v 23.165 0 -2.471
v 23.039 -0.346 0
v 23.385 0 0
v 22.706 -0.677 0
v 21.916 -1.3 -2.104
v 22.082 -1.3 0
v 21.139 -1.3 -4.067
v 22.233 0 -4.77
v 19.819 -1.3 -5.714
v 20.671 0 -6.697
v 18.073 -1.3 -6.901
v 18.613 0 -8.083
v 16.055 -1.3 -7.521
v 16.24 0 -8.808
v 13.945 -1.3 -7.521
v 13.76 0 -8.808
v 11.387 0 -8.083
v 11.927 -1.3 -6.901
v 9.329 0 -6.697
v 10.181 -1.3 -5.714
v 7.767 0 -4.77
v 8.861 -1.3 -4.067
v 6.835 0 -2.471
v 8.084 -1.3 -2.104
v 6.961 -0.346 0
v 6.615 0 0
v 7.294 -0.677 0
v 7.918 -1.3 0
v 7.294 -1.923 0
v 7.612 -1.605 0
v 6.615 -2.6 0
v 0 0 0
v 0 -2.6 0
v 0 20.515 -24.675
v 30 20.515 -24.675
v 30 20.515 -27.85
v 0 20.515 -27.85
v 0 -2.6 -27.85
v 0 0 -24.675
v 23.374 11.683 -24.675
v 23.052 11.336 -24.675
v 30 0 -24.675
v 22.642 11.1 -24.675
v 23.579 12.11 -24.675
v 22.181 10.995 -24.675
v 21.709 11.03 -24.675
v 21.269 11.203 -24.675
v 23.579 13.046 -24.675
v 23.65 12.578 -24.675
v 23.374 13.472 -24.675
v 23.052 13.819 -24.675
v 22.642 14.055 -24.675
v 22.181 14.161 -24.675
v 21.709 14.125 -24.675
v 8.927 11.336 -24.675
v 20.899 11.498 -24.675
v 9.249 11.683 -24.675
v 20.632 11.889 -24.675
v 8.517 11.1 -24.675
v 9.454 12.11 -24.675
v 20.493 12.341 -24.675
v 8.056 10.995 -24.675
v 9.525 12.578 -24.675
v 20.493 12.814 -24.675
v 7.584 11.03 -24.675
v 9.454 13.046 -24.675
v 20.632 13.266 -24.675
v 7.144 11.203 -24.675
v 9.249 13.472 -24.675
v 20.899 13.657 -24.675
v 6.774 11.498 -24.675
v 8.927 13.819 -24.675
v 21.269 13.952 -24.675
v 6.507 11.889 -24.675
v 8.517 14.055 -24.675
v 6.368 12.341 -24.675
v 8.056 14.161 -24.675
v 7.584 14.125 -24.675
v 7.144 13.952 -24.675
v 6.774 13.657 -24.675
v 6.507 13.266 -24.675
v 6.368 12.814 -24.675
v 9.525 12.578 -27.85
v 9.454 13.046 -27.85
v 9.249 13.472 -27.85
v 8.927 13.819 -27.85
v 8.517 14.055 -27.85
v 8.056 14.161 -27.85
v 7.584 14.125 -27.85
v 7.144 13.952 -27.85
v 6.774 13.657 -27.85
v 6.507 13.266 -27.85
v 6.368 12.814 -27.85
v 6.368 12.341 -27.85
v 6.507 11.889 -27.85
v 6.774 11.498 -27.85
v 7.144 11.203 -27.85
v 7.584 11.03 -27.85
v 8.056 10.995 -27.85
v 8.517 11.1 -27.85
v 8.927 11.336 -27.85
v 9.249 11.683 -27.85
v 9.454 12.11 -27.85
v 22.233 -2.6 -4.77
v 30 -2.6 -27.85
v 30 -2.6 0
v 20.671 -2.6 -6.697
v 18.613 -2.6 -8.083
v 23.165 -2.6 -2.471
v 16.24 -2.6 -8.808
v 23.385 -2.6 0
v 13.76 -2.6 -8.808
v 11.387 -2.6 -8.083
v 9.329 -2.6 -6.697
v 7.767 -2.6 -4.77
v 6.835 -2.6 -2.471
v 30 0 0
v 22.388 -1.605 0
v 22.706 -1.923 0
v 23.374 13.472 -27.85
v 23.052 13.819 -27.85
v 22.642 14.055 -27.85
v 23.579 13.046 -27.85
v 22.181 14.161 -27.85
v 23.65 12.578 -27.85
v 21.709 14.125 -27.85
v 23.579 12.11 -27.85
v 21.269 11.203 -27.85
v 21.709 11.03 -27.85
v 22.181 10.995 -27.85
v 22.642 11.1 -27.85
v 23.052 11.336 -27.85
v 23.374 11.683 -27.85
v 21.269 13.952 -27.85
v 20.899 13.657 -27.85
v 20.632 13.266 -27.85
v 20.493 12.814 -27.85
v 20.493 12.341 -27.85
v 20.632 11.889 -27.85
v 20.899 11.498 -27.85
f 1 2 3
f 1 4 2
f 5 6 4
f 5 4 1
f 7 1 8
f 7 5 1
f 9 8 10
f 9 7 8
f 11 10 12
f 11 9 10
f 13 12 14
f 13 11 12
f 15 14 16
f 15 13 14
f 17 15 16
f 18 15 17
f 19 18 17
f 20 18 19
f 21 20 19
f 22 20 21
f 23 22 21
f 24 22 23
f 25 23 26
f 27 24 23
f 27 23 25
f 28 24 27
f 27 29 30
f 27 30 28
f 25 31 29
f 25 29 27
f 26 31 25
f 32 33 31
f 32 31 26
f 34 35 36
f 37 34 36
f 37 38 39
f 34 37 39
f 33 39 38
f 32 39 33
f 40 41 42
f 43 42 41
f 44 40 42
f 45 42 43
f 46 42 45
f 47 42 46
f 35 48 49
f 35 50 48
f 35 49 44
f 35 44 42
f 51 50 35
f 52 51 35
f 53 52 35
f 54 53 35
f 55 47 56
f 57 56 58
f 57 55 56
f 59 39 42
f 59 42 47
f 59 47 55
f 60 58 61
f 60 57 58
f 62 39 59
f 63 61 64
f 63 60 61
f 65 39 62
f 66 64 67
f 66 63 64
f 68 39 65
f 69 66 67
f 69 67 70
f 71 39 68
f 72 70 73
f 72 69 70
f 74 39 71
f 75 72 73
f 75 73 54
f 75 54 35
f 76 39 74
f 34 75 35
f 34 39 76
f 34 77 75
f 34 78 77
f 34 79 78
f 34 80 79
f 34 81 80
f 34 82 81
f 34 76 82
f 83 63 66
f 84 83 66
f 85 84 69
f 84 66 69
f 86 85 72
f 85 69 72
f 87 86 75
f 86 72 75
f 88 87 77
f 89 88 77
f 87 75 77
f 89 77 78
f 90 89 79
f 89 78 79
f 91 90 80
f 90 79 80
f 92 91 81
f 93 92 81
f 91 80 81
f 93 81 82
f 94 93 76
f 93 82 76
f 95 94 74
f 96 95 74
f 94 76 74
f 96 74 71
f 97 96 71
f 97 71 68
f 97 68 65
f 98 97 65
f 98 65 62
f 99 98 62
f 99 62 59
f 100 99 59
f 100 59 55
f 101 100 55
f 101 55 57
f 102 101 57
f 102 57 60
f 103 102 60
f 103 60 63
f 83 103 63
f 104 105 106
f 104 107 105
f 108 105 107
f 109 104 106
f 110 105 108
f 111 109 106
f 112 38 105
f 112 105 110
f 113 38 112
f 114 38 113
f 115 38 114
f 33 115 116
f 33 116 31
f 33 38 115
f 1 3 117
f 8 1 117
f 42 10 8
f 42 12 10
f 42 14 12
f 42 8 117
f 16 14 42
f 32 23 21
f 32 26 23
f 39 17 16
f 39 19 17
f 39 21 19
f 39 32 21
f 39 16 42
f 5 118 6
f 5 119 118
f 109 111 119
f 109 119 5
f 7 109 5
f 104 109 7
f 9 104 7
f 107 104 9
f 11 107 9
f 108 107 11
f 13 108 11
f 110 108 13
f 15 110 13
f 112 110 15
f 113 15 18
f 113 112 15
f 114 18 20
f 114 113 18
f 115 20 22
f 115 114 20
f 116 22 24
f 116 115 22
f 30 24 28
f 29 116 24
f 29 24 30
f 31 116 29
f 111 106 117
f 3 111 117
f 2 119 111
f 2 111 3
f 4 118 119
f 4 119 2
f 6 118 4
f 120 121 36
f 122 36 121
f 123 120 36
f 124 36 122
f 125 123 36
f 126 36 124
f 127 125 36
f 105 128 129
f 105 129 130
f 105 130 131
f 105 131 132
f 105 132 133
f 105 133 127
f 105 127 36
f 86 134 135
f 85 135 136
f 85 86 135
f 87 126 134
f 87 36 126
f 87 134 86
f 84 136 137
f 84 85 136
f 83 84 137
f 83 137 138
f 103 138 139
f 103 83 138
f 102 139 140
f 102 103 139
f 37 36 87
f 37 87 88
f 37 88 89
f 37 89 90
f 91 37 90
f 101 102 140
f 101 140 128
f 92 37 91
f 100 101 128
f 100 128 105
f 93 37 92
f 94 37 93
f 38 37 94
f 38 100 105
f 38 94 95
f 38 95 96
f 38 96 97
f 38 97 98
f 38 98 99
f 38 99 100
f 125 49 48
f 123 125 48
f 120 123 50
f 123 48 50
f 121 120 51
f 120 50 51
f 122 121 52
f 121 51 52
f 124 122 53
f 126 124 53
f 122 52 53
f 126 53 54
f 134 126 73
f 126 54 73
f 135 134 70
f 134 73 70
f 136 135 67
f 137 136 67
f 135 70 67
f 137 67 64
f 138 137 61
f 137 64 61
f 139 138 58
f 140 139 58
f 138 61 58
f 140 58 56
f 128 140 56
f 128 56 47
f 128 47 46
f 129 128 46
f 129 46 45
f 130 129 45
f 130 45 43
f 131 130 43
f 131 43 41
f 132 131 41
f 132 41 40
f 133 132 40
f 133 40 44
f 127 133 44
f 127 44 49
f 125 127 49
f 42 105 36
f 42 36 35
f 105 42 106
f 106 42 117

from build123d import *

# Parameters (mm, degrees)
PROFILE_BOSS_EXTRUDE1_DEPTH      = 30
COLLARCUT_EXTRUDE1_DEPTH         = 46.78748337
COLLAR_CHAMFER2_SIZE             = 1.3
MOUNTINGHOLES_SKETCH3_R          = 1.5875
MOUNTINGHOLES_CUT_EXTRUDE2_DEPTH = 44.928655321


with BuildPart() as part:
    # Profile-Sketch1 → Profile-Boss-Extrude1 (new body)
    with BuildSketch(Plane(origin=(0, 0, 0), x_dir=(0, 0, -1), z_dir=(1, 0, 0))):
        Polygon((0, 0), (24.675, 0), (24.675, 20.515144), (27.85, 20.515144), (27.85, -2.6), (0, -2.6), align=None)
    extrude(amount=PROFILE_BOSS_EXTRUDE1_DEPTH)

    # CollarSketch2 → CollarCut-Extrude1 (cut, through all)
    with BuildSketch(Plane(origin=(0, 0, 0), x_dir=(1, 0, 0), z_dir=(0, 1, 0))):
        with BuildLine():
            Line((7.917627516, 0), (22.082372484, 0))
            ThreePointArc((22.082372484, 0), (15, 7.6), (7.917627516, 0))
        make_face()
    extrude(amount=-COLLARCUT_EXTRUDE1_DEPTH, mode=Mode.SUBTRACT)

    # Collar-Chamfer2
    collar_chamfer2_edges = [part.edges().sort_by_distance(p)[0] for p in [
        (15, -2.6, -7.6),
        (15, 0, -7.6),
    ]]
    chamfer(collar_chamfer2_edges, length=COLLAR_CHAMFER2_SIZE - 0.0001)  # a hair under: the kernel refuses the full size

    # MountingHoles-Sketch3 → MountingHoles-Cut-Extrude2 (cut, through all)
    with BuildSketch(Plane.XY.offset(-24.675)):
        with Locations((7.9375, 12.577644)):
            Circle(MOUNTINGHOLES_SKETCH3_R)
        with Locations((22.0625, 12.577644)):
            Circle(MOUNTINGHOLES_SKETCH3_R)
    extrude(amount=-MOUNTINGHOLES_CUT_EXTRUDE2_DEPTH, mode=Mode.SUBTRACT)


solid = part.part
